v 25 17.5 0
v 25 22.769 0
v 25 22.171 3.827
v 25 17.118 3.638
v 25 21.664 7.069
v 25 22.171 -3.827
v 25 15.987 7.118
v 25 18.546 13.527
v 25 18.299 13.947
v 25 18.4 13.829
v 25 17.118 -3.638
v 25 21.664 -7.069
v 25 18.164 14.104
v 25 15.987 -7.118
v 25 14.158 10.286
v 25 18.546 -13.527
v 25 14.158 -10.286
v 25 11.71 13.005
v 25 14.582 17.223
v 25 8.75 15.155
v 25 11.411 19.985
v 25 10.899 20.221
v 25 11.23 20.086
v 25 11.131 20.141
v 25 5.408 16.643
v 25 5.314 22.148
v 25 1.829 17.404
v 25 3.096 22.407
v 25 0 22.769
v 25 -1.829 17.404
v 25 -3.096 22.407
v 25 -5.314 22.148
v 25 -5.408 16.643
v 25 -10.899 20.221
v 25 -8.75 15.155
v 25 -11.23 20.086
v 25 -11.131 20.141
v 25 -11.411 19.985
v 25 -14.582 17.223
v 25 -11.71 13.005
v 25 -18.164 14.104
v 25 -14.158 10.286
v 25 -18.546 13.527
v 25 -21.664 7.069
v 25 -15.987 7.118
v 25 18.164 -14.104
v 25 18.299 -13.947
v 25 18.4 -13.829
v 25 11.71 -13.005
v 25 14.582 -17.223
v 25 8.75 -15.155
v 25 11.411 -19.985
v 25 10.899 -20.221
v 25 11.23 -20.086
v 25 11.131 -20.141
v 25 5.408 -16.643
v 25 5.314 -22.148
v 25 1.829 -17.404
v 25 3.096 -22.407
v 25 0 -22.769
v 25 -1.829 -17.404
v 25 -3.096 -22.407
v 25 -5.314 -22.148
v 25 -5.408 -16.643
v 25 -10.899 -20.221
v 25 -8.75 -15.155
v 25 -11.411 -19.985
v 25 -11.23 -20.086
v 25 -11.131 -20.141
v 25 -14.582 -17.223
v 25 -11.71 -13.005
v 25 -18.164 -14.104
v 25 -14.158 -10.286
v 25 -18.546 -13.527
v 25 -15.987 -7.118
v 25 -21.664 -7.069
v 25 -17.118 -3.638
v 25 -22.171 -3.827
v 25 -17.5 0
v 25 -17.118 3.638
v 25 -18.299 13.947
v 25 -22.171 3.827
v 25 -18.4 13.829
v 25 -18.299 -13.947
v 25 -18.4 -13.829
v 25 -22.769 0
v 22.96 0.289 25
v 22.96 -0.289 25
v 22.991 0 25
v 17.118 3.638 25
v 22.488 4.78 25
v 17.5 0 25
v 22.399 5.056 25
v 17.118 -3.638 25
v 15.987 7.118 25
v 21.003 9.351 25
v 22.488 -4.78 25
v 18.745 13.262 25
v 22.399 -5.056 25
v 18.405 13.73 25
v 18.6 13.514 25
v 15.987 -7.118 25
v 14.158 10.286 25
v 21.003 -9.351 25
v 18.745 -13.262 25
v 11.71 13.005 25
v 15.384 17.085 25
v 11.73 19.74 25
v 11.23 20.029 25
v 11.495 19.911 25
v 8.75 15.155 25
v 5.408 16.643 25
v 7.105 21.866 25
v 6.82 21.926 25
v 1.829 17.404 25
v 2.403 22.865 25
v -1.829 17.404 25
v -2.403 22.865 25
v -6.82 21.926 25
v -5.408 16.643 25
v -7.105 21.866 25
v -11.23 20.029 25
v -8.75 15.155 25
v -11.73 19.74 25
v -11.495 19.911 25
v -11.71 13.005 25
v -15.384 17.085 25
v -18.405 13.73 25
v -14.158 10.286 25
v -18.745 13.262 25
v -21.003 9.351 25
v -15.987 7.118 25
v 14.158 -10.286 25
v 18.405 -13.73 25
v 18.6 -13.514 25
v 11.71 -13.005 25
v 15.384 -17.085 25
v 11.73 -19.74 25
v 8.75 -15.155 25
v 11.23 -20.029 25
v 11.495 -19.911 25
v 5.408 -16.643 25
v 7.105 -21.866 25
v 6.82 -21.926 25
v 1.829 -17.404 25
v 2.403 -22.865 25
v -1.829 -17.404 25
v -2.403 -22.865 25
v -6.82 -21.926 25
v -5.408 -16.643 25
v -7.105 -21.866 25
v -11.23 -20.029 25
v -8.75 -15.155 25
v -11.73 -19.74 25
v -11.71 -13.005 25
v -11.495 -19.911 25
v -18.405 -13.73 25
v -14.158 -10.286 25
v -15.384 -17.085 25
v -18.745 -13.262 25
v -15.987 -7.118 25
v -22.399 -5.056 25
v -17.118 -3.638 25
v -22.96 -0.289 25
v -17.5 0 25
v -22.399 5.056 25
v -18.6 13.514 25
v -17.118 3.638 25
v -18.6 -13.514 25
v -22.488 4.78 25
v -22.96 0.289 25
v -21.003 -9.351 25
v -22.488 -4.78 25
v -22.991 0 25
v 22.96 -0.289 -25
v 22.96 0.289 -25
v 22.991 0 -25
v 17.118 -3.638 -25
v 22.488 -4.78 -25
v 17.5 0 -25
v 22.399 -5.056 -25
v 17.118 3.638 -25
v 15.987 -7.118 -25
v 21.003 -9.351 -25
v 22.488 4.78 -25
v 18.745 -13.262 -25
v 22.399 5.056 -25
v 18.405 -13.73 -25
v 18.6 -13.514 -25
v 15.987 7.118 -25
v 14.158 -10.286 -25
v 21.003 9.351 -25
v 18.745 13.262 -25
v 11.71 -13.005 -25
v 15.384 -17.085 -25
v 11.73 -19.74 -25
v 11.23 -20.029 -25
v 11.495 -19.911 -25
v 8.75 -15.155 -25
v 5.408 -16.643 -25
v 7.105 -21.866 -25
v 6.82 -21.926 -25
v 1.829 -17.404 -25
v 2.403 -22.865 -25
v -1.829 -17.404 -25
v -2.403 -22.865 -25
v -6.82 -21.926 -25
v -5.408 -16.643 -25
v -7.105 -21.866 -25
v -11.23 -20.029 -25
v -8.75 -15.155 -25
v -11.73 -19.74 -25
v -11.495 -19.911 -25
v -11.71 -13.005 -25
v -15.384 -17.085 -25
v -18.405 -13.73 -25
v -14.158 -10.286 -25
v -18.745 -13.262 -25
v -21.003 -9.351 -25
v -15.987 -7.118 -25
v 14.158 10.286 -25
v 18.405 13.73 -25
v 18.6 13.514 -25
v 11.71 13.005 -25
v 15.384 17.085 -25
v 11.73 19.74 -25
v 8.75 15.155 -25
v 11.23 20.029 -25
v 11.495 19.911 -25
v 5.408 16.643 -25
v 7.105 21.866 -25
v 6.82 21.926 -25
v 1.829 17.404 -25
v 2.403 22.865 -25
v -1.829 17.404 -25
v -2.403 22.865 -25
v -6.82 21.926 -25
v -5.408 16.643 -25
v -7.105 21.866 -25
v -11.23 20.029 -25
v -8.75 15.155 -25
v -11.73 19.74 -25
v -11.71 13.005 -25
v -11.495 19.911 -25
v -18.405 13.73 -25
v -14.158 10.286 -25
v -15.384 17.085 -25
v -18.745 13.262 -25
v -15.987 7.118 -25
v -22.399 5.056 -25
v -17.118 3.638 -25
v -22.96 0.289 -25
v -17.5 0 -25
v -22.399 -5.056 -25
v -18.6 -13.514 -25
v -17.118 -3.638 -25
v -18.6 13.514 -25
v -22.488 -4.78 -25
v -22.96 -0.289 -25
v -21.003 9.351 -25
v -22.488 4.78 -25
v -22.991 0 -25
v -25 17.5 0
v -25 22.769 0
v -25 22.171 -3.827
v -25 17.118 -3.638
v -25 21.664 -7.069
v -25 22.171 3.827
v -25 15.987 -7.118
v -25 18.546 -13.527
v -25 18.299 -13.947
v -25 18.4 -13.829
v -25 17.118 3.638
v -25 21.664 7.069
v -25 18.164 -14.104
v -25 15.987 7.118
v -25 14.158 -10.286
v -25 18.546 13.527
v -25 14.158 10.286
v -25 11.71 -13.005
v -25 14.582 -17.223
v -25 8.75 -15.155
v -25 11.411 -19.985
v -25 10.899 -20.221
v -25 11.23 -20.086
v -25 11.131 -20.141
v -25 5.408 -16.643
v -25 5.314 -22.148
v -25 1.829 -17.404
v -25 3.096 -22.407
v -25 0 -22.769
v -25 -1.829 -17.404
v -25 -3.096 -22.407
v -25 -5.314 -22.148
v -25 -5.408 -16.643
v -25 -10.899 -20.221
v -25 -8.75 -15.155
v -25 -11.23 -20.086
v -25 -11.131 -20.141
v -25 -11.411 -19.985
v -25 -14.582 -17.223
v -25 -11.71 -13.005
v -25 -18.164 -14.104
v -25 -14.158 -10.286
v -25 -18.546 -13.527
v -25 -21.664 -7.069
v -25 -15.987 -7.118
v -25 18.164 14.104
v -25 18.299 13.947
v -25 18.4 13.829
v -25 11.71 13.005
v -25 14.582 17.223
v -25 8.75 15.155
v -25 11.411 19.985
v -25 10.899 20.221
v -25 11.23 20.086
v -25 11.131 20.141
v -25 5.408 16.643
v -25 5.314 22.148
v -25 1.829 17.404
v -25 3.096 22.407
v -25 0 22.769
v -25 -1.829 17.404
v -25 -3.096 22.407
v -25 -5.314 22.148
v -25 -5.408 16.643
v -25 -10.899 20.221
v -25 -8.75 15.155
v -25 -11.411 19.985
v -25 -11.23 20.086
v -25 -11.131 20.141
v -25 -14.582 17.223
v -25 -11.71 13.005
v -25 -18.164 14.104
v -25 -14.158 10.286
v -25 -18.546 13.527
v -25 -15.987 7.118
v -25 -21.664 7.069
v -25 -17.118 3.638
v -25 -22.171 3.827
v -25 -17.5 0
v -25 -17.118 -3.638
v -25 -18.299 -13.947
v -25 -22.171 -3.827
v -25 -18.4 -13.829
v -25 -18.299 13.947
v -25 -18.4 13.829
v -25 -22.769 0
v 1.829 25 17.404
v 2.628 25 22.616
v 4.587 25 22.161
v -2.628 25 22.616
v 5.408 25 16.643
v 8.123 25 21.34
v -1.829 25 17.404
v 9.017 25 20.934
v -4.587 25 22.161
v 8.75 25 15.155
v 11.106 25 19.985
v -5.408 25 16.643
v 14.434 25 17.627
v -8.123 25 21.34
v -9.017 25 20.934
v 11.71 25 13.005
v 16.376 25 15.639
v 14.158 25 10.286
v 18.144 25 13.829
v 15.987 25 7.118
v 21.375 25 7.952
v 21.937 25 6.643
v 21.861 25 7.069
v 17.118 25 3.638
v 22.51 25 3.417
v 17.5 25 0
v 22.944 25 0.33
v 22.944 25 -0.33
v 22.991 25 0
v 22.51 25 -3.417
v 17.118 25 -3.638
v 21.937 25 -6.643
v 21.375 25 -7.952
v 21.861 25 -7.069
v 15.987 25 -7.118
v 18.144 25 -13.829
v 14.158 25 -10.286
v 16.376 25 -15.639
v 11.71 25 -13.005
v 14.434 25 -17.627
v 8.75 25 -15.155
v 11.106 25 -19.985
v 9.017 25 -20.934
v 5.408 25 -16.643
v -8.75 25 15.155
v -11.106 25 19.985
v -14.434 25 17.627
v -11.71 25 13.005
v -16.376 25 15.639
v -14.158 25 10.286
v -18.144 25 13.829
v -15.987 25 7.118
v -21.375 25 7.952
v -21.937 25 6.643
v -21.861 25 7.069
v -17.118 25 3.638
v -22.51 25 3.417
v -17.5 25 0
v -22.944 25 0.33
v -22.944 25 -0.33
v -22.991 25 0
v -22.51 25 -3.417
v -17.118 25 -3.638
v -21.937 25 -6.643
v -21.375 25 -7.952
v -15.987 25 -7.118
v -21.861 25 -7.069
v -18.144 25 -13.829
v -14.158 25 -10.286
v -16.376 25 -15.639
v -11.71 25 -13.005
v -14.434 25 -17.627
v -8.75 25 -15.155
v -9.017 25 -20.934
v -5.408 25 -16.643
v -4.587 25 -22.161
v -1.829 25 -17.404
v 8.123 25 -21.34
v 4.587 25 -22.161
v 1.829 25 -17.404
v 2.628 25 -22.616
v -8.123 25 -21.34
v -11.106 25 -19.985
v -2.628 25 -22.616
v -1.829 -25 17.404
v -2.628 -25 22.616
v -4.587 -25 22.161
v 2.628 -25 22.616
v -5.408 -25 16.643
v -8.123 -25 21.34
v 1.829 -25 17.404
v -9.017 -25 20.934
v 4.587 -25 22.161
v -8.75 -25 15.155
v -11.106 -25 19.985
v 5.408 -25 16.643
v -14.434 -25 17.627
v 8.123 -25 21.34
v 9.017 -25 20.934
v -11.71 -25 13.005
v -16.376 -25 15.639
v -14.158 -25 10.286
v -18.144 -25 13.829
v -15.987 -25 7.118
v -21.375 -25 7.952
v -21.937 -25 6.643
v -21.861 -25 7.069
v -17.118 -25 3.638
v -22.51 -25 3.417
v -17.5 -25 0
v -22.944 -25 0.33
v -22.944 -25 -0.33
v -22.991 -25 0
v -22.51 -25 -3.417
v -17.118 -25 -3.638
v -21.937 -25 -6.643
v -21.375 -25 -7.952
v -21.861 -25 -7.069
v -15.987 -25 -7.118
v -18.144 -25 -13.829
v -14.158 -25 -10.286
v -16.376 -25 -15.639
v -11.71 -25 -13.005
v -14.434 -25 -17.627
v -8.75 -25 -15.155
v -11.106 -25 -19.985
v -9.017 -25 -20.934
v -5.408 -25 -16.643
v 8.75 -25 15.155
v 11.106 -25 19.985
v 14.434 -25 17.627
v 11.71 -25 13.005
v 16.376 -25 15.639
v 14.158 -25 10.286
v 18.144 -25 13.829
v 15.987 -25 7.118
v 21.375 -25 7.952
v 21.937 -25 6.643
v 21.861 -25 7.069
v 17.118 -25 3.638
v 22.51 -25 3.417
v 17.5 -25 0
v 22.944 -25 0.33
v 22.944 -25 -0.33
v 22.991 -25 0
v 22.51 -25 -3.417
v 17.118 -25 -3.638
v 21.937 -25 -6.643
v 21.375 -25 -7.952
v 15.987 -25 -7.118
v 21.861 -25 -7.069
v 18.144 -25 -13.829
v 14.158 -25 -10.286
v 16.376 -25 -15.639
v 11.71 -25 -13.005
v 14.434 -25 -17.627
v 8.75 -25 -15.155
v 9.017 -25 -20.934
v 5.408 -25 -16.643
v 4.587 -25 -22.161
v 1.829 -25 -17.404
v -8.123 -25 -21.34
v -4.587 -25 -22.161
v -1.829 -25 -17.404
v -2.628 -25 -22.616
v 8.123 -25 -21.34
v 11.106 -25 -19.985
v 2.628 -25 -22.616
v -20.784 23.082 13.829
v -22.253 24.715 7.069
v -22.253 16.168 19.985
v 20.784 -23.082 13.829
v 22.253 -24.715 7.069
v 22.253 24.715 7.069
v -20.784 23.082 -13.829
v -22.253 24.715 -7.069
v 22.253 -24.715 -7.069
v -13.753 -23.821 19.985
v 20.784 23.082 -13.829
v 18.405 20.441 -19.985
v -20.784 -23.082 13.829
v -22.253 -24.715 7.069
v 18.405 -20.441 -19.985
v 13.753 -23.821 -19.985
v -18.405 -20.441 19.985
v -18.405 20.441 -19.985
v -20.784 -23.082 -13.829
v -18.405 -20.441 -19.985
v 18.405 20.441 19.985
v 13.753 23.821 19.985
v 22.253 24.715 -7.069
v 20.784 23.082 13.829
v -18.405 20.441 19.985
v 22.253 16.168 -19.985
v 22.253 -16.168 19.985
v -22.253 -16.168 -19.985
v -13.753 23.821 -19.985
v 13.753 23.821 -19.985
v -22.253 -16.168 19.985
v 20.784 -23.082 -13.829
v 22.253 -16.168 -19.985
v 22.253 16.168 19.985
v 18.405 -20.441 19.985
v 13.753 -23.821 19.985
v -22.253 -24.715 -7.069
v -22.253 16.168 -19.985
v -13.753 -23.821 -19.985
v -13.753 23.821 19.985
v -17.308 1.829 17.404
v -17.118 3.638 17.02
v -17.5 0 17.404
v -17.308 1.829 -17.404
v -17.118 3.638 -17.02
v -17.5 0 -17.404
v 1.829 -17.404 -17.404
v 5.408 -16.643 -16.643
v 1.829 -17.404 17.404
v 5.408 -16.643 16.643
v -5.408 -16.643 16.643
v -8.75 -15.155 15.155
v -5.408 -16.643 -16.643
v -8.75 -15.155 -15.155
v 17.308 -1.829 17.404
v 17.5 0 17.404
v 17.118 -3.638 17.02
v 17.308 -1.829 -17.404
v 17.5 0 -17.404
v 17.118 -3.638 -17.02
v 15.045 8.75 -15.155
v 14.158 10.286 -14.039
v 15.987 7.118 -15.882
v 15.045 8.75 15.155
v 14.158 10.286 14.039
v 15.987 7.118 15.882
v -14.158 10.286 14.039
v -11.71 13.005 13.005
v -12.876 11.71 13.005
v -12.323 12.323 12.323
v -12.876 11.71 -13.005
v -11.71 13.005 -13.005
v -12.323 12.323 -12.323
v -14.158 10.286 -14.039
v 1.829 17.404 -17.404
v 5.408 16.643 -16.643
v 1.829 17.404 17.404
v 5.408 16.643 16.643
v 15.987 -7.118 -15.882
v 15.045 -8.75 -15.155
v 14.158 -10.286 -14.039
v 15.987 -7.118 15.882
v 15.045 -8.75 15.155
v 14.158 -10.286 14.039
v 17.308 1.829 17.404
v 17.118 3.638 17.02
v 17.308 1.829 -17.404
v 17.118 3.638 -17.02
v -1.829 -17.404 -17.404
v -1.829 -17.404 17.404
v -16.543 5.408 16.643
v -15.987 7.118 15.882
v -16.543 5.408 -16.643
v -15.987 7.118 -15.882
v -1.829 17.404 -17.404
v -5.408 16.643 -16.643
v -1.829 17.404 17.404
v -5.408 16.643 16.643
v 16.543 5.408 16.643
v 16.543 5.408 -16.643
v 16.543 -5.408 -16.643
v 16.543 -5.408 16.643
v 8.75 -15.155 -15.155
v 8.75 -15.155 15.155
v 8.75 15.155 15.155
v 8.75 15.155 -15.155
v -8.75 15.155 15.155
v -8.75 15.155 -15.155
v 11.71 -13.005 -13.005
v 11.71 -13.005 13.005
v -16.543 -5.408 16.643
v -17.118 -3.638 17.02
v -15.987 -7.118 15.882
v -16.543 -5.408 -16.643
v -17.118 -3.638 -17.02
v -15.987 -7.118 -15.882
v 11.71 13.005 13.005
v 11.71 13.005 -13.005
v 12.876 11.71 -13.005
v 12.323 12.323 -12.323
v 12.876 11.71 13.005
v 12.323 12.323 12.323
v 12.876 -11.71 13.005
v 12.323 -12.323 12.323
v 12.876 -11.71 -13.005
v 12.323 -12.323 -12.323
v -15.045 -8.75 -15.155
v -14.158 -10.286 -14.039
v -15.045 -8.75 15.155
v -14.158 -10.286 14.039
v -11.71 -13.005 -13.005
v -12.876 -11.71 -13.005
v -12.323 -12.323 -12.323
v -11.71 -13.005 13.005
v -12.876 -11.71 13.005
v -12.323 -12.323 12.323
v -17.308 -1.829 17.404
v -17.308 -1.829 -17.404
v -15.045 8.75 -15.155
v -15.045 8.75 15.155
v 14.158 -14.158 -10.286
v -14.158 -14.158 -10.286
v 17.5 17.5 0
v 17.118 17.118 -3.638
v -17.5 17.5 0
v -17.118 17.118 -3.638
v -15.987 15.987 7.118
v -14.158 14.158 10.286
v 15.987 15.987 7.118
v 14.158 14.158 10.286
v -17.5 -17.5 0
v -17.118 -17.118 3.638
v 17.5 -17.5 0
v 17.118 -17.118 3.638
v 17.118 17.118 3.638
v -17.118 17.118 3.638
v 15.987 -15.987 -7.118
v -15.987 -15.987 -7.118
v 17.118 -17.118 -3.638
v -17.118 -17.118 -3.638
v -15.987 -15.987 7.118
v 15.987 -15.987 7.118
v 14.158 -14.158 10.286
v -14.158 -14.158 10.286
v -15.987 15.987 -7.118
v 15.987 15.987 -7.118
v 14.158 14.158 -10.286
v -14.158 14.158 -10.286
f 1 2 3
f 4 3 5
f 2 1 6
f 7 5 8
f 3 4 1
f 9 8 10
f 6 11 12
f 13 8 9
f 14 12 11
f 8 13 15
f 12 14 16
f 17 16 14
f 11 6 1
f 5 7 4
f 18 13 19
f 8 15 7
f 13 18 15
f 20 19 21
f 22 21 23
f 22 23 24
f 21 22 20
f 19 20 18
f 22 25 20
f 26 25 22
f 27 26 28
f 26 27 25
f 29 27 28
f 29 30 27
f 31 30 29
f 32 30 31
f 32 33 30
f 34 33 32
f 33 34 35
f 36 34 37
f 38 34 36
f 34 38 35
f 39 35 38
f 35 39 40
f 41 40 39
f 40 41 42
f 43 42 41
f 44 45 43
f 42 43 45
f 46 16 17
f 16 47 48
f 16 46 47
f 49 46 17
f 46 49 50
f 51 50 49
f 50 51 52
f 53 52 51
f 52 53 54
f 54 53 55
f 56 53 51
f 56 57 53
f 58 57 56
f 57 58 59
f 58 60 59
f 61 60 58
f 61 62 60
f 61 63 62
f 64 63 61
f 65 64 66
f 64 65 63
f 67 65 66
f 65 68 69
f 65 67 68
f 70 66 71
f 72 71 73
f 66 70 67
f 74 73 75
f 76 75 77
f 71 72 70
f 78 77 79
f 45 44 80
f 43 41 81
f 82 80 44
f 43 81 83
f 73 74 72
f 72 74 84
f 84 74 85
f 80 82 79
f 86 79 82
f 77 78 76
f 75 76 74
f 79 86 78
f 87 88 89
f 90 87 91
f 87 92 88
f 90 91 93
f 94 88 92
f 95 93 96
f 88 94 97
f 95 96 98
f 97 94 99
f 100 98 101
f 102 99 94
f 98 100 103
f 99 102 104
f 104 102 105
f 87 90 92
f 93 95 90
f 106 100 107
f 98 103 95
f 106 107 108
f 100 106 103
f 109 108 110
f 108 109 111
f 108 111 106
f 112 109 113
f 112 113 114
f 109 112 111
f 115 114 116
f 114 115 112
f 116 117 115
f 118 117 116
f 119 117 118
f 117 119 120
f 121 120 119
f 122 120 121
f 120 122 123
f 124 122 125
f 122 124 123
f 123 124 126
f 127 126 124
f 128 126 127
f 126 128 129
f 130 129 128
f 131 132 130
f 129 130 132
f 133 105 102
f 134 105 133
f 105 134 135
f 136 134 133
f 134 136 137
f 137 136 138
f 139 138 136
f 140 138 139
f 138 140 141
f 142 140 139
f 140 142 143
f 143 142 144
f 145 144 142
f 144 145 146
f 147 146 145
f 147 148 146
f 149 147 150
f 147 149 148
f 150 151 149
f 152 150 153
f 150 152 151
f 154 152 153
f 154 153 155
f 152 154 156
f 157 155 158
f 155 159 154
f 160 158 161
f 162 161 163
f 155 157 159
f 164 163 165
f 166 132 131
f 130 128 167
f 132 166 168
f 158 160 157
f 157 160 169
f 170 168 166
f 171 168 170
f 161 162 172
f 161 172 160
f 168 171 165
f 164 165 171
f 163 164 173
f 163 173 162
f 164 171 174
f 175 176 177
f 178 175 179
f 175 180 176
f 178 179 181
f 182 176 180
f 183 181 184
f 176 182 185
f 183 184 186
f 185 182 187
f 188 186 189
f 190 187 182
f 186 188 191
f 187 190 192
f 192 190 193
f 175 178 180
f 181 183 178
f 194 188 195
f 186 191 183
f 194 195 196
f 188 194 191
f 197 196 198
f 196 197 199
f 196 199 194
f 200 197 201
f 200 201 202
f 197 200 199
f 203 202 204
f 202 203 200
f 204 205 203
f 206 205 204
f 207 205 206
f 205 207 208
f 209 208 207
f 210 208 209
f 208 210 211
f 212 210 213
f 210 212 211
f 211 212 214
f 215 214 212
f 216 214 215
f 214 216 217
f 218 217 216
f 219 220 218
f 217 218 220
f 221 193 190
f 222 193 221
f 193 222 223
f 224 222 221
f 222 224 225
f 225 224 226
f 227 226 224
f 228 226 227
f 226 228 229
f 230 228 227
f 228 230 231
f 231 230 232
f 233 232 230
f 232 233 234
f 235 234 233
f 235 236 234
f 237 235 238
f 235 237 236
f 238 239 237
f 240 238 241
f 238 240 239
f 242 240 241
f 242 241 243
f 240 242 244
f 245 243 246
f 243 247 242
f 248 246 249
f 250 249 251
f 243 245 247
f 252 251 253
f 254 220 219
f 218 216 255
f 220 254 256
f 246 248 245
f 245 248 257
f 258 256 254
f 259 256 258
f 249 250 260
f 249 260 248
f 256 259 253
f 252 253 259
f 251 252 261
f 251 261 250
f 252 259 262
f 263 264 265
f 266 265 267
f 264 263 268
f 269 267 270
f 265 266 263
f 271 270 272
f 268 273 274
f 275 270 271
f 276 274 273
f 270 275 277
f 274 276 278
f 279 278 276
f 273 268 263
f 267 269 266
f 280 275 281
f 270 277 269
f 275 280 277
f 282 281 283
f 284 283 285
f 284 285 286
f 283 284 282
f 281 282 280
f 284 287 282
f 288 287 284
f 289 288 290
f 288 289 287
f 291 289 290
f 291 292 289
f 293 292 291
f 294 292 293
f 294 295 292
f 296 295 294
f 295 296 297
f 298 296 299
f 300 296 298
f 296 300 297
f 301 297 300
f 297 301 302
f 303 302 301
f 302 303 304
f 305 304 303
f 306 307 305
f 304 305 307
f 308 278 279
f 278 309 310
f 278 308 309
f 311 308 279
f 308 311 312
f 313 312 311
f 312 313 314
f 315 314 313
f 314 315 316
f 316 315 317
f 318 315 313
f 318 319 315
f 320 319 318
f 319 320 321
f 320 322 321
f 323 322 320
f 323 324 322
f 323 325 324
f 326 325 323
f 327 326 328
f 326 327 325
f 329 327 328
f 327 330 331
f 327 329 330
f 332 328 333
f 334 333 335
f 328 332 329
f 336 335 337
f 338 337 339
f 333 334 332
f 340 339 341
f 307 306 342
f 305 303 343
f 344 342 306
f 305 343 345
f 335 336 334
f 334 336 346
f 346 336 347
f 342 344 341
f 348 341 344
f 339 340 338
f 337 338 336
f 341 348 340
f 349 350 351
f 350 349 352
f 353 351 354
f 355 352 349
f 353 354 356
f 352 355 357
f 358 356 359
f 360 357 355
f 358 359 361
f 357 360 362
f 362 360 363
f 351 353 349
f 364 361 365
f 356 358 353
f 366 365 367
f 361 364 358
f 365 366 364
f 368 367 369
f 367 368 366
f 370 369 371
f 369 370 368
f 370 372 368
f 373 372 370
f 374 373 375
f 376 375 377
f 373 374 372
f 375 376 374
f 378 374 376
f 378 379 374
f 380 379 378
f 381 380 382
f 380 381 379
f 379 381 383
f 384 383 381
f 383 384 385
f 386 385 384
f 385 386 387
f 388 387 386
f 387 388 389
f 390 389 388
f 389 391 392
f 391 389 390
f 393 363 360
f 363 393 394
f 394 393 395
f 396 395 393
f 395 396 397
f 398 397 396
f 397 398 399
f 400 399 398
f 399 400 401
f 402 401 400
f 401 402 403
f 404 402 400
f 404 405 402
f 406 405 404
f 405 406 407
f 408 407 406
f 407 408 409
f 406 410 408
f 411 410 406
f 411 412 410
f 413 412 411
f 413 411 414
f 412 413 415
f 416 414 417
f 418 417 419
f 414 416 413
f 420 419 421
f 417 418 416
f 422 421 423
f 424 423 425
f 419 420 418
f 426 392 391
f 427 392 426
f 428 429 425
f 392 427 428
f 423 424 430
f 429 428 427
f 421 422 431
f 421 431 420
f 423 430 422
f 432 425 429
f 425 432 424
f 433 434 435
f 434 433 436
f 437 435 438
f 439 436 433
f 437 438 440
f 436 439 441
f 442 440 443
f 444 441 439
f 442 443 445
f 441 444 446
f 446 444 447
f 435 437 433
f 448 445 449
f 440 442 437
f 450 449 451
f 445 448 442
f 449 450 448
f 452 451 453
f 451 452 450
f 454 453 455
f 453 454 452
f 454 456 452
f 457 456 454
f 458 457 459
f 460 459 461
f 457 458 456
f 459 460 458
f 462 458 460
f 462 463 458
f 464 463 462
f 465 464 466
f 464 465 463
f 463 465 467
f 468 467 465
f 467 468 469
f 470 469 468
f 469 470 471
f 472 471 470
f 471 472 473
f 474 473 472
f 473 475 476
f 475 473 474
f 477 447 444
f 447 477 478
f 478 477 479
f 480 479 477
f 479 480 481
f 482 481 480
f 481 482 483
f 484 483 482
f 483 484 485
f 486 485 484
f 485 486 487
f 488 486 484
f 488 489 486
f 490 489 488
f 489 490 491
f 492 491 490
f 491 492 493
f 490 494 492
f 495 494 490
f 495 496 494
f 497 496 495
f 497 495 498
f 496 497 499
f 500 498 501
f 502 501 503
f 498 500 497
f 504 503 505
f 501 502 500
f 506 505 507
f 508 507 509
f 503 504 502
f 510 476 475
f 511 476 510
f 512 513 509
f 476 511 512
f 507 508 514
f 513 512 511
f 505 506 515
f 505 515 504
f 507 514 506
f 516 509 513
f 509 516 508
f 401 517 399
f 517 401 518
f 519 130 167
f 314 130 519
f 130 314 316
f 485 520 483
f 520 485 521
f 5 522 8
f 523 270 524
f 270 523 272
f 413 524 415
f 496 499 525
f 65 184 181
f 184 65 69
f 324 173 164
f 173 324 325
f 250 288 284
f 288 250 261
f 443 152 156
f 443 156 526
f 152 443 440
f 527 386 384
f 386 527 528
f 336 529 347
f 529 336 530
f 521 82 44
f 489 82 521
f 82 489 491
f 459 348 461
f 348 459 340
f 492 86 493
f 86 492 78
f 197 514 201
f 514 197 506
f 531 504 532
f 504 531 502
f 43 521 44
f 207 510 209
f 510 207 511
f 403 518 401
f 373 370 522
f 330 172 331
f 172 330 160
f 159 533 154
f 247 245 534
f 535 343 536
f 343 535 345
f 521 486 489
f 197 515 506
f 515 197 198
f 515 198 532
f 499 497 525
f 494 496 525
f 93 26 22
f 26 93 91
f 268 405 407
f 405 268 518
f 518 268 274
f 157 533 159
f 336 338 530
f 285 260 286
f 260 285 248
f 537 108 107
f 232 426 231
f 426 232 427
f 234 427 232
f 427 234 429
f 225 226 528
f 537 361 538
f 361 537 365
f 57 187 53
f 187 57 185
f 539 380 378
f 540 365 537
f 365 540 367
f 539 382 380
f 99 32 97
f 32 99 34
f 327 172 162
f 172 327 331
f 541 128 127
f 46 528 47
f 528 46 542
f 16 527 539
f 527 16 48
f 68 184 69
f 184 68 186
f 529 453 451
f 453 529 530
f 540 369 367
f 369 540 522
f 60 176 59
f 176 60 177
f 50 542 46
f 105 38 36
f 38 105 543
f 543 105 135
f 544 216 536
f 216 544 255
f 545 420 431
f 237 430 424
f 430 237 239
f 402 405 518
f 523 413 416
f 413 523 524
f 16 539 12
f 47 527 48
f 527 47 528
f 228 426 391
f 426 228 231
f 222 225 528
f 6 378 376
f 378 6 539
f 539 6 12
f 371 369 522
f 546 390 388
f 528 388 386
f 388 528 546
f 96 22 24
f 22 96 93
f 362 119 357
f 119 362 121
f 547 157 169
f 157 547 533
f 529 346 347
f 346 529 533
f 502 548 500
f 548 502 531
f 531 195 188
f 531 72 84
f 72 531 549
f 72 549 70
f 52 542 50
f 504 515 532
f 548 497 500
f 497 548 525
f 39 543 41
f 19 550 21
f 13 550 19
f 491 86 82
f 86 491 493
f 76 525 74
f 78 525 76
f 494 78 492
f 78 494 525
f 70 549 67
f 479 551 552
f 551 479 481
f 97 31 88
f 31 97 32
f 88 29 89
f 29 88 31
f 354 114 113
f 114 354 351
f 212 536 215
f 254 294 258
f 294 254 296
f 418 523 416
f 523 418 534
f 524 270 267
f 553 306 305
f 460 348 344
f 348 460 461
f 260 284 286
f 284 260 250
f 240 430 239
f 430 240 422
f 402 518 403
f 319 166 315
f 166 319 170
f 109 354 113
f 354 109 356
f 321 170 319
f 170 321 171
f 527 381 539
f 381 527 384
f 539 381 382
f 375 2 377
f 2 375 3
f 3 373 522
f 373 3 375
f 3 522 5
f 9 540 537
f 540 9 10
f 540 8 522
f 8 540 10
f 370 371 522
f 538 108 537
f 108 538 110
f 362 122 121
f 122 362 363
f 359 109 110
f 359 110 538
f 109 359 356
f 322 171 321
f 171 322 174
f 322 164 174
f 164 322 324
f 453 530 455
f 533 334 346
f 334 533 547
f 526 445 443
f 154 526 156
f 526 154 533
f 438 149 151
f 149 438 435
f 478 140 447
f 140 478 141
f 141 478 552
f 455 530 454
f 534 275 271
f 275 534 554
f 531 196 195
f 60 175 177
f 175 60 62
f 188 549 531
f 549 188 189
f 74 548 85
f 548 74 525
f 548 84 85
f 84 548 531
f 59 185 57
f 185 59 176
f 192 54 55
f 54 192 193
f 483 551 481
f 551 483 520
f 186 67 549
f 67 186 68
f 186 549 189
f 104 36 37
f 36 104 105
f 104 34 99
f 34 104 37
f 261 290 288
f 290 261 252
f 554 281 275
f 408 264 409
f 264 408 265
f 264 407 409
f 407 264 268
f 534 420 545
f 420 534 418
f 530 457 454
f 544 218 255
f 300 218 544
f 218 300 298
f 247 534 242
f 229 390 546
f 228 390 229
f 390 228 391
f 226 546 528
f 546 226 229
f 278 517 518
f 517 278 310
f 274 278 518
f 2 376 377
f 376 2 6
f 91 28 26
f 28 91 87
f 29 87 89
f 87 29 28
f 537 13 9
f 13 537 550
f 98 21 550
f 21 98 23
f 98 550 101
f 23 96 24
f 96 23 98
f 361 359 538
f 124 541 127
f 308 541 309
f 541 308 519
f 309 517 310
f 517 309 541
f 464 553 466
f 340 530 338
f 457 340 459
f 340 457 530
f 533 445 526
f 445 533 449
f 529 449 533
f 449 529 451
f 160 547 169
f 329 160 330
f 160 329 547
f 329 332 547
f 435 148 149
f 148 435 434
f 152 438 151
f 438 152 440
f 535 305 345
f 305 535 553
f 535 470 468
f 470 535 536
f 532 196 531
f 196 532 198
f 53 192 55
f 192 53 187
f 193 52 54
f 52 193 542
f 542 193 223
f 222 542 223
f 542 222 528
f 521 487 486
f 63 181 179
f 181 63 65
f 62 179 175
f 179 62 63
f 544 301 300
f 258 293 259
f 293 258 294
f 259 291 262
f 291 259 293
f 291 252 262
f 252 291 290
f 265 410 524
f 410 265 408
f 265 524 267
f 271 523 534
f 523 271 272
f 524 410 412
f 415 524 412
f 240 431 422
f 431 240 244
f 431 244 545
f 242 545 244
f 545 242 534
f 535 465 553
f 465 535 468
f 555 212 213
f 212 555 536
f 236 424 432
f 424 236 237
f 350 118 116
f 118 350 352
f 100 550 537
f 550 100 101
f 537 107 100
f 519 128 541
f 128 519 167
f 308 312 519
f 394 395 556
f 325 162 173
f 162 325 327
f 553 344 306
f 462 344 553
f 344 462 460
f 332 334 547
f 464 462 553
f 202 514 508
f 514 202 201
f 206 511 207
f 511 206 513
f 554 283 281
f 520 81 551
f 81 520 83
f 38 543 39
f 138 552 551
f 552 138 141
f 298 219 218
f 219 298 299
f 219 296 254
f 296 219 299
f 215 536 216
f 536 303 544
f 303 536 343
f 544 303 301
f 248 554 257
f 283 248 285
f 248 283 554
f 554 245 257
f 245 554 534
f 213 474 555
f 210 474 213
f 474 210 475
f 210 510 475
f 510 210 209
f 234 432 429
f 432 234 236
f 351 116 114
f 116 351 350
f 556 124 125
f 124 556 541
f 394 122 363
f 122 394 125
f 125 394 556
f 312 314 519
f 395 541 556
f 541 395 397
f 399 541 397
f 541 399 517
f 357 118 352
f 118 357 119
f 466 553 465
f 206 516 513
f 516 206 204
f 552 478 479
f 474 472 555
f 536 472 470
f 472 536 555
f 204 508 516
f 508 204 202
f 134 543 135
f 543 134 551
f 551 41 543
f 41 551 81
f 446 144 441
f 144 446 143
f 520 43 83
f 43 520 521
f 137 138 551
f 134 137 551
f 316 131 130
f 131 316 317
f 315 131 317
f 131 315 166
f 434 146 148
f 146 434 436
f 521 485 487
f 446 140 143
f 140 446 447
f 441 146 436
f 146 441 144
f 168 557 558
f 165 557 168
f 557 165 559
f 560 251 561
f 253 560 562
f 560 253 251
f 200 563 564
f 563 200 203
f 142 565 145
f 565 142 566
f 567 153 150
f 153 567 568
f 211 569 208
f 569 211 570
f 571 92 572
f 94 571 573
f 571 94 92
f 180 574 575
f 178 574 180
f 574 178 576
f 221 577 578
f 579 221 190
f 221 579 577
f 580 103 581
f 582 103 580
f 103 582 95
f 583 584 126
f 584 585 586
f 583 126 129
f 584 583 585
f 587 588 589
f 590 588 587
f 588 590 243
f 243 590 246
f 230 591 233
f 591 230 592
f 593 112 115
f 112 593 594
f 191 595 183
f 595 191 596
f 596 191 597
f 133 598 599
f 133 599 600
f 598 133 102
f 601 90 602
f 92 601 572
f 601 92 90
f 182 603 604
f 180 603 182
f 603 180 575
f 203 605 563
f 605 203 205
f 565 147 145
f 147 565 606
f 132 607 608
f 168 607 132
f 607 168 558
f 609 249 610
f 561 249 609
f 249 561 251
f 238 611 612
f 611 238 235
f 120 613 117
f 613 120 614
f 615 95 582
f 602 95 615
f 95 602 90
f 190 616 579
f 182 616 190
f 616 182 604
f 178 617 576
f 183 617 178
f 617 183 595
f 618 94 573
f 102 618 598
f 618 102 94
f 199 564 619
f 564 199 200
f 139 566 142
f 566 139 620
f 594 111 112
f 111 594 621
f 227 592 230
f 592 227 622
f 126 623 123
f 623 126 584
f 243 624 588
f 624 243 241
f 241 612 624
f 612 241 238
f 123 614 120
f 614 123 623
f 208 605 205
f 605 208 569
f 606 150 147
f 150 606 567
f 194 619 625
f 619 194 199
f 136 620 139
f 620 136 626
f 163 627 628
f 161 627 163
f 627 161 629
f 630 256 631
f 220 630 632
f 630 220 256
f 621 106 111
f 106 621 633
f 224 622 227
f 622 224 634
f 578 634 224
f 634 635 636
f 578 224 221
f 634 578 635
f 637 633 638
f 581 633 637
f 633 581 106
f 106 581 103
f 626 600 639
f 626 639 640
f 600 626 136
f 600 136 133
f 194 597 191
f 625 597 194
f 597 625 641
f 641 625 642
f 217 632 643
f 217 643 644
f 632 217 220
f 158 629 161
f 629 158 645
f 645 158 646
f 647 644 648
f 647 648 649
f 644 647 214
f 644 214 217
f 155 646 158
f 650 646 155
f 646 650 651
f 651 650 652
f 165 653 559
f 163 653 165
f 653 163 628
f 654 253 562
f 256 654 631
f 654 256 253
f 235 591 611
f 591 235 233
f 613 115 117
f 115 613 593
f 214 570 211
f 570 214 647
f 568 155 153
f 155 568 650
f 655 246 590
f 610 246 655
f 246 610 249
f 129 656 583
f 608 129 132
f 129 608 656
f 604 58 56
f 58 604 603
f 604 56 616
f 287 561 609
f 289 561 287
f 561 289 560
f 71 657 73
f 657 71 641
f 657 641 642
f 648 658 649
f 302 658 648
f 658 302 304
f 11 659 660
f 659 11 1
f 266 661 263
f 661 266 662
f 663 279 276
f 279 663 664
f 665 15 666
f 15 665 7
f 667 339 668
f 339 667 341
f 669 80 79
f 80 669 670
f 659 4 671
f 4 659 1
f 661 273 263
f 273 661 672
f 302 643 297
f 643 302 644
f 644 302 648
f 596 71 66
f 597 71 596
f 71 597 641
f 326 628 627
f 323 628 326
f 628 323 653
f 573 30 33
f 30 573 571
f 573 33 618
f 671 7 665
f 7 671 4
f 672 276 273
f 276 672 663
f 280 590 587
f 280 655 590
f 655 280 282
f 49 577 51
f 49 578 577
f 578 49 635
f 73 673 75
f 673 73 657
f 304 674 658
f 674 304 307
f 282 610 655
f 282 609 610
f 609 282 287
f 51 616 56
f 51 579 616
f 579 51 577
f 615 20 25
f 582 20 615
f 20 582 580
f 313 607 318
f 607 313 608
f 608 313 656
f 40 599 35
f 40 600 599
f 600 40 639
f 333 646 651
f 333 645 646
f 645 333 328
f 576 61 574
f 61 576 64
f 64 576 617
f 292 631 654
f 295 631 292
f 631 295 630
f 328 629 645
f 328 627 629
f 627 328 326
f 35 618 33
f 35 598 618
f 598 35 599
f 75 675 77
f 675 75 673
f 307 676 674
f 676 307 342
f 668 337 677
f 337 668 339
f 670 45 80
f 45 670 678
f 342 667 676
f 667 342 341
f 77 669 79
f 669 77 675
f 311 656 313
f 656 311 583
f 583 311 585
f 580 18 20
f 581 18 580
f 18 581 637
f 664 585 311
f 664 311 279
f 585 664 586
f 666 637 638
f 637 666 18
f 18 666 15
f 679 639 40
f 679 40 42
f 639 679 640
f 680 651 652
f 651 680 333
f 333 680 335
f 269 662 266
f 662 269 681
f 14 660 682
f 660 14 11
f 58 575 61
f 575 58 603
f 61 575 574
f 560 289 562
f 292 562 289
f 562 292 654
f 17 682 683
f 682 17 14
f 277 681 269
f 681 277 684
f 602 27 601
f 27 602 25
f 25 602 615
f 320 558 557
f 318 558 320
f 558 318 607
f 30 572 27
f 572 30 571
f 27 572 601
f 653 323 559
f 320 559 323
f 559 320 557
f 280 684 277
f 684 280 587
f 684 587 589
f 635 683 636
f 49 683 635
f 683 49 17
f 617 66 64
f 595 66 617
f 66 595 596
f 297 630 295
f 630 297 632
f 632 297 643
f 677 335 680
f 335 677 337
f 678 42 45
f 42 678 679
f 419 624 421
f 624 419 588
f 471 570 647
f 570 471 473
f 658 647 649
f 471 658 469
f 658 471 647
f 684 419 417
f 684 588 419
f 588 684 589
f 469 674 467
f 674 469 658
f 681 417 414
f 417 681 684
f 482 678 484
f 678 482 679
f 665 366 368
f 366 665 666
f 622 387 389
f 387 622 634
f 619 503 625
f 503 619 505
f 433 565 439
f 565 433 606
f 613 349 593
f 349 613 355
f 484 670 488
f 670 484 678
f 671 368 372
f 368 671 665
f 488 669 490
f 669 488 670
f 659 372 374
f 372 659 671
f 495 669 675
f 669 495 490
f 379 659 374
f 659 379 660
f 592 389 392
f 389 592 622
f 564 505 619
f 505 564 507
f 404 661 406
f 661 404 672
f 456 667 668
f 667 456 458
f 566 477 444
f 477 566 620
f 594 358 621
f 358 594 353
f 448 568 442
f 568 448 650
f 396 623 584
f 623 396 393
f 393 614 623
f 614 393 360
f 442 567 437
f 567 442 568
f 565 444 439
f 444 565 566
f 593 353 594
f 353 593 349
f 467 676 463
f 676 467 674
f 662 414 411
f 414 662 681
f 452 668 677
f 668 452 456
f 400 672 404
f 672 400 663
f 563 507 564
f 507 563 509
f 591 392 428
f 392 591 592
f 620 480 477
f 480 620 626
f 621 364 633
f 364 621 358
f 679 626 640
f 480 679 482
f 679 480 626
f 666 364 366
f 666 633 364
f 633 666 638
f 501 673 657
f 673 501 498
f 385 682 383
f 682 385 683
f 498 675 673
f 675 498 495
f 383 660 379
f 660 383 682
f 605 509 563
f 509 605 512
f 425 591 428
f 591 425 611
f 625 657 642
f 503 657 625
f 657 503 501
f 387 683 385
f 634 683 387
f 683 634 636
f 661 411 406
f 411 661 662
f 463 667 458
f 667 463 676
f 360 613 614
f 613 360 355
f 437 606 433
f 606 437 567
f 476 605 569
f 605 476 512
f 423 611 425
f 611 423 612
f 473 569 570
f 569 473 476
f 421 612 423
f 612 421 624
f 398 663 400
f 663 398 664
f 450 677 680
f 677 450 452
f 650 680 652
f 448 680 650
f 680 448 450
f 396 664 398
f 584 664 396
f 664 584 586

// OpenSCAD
difference() {
    
    intersection() {
    color("red")  cube([50, 50, 50],  center = true);
    color("blue") sphere(d = 68);
    }
    
    union(){
        color("green") cylinder(h=50, d = 35, center = true);
        rotate([90, 0, 90]) 
            color("green") cylinder(h=50, d = 35, center = true);
        rotate([90, 0, 0]) 
            color("green") cylinder(h=50, d = 35, center = true);
    }
}
